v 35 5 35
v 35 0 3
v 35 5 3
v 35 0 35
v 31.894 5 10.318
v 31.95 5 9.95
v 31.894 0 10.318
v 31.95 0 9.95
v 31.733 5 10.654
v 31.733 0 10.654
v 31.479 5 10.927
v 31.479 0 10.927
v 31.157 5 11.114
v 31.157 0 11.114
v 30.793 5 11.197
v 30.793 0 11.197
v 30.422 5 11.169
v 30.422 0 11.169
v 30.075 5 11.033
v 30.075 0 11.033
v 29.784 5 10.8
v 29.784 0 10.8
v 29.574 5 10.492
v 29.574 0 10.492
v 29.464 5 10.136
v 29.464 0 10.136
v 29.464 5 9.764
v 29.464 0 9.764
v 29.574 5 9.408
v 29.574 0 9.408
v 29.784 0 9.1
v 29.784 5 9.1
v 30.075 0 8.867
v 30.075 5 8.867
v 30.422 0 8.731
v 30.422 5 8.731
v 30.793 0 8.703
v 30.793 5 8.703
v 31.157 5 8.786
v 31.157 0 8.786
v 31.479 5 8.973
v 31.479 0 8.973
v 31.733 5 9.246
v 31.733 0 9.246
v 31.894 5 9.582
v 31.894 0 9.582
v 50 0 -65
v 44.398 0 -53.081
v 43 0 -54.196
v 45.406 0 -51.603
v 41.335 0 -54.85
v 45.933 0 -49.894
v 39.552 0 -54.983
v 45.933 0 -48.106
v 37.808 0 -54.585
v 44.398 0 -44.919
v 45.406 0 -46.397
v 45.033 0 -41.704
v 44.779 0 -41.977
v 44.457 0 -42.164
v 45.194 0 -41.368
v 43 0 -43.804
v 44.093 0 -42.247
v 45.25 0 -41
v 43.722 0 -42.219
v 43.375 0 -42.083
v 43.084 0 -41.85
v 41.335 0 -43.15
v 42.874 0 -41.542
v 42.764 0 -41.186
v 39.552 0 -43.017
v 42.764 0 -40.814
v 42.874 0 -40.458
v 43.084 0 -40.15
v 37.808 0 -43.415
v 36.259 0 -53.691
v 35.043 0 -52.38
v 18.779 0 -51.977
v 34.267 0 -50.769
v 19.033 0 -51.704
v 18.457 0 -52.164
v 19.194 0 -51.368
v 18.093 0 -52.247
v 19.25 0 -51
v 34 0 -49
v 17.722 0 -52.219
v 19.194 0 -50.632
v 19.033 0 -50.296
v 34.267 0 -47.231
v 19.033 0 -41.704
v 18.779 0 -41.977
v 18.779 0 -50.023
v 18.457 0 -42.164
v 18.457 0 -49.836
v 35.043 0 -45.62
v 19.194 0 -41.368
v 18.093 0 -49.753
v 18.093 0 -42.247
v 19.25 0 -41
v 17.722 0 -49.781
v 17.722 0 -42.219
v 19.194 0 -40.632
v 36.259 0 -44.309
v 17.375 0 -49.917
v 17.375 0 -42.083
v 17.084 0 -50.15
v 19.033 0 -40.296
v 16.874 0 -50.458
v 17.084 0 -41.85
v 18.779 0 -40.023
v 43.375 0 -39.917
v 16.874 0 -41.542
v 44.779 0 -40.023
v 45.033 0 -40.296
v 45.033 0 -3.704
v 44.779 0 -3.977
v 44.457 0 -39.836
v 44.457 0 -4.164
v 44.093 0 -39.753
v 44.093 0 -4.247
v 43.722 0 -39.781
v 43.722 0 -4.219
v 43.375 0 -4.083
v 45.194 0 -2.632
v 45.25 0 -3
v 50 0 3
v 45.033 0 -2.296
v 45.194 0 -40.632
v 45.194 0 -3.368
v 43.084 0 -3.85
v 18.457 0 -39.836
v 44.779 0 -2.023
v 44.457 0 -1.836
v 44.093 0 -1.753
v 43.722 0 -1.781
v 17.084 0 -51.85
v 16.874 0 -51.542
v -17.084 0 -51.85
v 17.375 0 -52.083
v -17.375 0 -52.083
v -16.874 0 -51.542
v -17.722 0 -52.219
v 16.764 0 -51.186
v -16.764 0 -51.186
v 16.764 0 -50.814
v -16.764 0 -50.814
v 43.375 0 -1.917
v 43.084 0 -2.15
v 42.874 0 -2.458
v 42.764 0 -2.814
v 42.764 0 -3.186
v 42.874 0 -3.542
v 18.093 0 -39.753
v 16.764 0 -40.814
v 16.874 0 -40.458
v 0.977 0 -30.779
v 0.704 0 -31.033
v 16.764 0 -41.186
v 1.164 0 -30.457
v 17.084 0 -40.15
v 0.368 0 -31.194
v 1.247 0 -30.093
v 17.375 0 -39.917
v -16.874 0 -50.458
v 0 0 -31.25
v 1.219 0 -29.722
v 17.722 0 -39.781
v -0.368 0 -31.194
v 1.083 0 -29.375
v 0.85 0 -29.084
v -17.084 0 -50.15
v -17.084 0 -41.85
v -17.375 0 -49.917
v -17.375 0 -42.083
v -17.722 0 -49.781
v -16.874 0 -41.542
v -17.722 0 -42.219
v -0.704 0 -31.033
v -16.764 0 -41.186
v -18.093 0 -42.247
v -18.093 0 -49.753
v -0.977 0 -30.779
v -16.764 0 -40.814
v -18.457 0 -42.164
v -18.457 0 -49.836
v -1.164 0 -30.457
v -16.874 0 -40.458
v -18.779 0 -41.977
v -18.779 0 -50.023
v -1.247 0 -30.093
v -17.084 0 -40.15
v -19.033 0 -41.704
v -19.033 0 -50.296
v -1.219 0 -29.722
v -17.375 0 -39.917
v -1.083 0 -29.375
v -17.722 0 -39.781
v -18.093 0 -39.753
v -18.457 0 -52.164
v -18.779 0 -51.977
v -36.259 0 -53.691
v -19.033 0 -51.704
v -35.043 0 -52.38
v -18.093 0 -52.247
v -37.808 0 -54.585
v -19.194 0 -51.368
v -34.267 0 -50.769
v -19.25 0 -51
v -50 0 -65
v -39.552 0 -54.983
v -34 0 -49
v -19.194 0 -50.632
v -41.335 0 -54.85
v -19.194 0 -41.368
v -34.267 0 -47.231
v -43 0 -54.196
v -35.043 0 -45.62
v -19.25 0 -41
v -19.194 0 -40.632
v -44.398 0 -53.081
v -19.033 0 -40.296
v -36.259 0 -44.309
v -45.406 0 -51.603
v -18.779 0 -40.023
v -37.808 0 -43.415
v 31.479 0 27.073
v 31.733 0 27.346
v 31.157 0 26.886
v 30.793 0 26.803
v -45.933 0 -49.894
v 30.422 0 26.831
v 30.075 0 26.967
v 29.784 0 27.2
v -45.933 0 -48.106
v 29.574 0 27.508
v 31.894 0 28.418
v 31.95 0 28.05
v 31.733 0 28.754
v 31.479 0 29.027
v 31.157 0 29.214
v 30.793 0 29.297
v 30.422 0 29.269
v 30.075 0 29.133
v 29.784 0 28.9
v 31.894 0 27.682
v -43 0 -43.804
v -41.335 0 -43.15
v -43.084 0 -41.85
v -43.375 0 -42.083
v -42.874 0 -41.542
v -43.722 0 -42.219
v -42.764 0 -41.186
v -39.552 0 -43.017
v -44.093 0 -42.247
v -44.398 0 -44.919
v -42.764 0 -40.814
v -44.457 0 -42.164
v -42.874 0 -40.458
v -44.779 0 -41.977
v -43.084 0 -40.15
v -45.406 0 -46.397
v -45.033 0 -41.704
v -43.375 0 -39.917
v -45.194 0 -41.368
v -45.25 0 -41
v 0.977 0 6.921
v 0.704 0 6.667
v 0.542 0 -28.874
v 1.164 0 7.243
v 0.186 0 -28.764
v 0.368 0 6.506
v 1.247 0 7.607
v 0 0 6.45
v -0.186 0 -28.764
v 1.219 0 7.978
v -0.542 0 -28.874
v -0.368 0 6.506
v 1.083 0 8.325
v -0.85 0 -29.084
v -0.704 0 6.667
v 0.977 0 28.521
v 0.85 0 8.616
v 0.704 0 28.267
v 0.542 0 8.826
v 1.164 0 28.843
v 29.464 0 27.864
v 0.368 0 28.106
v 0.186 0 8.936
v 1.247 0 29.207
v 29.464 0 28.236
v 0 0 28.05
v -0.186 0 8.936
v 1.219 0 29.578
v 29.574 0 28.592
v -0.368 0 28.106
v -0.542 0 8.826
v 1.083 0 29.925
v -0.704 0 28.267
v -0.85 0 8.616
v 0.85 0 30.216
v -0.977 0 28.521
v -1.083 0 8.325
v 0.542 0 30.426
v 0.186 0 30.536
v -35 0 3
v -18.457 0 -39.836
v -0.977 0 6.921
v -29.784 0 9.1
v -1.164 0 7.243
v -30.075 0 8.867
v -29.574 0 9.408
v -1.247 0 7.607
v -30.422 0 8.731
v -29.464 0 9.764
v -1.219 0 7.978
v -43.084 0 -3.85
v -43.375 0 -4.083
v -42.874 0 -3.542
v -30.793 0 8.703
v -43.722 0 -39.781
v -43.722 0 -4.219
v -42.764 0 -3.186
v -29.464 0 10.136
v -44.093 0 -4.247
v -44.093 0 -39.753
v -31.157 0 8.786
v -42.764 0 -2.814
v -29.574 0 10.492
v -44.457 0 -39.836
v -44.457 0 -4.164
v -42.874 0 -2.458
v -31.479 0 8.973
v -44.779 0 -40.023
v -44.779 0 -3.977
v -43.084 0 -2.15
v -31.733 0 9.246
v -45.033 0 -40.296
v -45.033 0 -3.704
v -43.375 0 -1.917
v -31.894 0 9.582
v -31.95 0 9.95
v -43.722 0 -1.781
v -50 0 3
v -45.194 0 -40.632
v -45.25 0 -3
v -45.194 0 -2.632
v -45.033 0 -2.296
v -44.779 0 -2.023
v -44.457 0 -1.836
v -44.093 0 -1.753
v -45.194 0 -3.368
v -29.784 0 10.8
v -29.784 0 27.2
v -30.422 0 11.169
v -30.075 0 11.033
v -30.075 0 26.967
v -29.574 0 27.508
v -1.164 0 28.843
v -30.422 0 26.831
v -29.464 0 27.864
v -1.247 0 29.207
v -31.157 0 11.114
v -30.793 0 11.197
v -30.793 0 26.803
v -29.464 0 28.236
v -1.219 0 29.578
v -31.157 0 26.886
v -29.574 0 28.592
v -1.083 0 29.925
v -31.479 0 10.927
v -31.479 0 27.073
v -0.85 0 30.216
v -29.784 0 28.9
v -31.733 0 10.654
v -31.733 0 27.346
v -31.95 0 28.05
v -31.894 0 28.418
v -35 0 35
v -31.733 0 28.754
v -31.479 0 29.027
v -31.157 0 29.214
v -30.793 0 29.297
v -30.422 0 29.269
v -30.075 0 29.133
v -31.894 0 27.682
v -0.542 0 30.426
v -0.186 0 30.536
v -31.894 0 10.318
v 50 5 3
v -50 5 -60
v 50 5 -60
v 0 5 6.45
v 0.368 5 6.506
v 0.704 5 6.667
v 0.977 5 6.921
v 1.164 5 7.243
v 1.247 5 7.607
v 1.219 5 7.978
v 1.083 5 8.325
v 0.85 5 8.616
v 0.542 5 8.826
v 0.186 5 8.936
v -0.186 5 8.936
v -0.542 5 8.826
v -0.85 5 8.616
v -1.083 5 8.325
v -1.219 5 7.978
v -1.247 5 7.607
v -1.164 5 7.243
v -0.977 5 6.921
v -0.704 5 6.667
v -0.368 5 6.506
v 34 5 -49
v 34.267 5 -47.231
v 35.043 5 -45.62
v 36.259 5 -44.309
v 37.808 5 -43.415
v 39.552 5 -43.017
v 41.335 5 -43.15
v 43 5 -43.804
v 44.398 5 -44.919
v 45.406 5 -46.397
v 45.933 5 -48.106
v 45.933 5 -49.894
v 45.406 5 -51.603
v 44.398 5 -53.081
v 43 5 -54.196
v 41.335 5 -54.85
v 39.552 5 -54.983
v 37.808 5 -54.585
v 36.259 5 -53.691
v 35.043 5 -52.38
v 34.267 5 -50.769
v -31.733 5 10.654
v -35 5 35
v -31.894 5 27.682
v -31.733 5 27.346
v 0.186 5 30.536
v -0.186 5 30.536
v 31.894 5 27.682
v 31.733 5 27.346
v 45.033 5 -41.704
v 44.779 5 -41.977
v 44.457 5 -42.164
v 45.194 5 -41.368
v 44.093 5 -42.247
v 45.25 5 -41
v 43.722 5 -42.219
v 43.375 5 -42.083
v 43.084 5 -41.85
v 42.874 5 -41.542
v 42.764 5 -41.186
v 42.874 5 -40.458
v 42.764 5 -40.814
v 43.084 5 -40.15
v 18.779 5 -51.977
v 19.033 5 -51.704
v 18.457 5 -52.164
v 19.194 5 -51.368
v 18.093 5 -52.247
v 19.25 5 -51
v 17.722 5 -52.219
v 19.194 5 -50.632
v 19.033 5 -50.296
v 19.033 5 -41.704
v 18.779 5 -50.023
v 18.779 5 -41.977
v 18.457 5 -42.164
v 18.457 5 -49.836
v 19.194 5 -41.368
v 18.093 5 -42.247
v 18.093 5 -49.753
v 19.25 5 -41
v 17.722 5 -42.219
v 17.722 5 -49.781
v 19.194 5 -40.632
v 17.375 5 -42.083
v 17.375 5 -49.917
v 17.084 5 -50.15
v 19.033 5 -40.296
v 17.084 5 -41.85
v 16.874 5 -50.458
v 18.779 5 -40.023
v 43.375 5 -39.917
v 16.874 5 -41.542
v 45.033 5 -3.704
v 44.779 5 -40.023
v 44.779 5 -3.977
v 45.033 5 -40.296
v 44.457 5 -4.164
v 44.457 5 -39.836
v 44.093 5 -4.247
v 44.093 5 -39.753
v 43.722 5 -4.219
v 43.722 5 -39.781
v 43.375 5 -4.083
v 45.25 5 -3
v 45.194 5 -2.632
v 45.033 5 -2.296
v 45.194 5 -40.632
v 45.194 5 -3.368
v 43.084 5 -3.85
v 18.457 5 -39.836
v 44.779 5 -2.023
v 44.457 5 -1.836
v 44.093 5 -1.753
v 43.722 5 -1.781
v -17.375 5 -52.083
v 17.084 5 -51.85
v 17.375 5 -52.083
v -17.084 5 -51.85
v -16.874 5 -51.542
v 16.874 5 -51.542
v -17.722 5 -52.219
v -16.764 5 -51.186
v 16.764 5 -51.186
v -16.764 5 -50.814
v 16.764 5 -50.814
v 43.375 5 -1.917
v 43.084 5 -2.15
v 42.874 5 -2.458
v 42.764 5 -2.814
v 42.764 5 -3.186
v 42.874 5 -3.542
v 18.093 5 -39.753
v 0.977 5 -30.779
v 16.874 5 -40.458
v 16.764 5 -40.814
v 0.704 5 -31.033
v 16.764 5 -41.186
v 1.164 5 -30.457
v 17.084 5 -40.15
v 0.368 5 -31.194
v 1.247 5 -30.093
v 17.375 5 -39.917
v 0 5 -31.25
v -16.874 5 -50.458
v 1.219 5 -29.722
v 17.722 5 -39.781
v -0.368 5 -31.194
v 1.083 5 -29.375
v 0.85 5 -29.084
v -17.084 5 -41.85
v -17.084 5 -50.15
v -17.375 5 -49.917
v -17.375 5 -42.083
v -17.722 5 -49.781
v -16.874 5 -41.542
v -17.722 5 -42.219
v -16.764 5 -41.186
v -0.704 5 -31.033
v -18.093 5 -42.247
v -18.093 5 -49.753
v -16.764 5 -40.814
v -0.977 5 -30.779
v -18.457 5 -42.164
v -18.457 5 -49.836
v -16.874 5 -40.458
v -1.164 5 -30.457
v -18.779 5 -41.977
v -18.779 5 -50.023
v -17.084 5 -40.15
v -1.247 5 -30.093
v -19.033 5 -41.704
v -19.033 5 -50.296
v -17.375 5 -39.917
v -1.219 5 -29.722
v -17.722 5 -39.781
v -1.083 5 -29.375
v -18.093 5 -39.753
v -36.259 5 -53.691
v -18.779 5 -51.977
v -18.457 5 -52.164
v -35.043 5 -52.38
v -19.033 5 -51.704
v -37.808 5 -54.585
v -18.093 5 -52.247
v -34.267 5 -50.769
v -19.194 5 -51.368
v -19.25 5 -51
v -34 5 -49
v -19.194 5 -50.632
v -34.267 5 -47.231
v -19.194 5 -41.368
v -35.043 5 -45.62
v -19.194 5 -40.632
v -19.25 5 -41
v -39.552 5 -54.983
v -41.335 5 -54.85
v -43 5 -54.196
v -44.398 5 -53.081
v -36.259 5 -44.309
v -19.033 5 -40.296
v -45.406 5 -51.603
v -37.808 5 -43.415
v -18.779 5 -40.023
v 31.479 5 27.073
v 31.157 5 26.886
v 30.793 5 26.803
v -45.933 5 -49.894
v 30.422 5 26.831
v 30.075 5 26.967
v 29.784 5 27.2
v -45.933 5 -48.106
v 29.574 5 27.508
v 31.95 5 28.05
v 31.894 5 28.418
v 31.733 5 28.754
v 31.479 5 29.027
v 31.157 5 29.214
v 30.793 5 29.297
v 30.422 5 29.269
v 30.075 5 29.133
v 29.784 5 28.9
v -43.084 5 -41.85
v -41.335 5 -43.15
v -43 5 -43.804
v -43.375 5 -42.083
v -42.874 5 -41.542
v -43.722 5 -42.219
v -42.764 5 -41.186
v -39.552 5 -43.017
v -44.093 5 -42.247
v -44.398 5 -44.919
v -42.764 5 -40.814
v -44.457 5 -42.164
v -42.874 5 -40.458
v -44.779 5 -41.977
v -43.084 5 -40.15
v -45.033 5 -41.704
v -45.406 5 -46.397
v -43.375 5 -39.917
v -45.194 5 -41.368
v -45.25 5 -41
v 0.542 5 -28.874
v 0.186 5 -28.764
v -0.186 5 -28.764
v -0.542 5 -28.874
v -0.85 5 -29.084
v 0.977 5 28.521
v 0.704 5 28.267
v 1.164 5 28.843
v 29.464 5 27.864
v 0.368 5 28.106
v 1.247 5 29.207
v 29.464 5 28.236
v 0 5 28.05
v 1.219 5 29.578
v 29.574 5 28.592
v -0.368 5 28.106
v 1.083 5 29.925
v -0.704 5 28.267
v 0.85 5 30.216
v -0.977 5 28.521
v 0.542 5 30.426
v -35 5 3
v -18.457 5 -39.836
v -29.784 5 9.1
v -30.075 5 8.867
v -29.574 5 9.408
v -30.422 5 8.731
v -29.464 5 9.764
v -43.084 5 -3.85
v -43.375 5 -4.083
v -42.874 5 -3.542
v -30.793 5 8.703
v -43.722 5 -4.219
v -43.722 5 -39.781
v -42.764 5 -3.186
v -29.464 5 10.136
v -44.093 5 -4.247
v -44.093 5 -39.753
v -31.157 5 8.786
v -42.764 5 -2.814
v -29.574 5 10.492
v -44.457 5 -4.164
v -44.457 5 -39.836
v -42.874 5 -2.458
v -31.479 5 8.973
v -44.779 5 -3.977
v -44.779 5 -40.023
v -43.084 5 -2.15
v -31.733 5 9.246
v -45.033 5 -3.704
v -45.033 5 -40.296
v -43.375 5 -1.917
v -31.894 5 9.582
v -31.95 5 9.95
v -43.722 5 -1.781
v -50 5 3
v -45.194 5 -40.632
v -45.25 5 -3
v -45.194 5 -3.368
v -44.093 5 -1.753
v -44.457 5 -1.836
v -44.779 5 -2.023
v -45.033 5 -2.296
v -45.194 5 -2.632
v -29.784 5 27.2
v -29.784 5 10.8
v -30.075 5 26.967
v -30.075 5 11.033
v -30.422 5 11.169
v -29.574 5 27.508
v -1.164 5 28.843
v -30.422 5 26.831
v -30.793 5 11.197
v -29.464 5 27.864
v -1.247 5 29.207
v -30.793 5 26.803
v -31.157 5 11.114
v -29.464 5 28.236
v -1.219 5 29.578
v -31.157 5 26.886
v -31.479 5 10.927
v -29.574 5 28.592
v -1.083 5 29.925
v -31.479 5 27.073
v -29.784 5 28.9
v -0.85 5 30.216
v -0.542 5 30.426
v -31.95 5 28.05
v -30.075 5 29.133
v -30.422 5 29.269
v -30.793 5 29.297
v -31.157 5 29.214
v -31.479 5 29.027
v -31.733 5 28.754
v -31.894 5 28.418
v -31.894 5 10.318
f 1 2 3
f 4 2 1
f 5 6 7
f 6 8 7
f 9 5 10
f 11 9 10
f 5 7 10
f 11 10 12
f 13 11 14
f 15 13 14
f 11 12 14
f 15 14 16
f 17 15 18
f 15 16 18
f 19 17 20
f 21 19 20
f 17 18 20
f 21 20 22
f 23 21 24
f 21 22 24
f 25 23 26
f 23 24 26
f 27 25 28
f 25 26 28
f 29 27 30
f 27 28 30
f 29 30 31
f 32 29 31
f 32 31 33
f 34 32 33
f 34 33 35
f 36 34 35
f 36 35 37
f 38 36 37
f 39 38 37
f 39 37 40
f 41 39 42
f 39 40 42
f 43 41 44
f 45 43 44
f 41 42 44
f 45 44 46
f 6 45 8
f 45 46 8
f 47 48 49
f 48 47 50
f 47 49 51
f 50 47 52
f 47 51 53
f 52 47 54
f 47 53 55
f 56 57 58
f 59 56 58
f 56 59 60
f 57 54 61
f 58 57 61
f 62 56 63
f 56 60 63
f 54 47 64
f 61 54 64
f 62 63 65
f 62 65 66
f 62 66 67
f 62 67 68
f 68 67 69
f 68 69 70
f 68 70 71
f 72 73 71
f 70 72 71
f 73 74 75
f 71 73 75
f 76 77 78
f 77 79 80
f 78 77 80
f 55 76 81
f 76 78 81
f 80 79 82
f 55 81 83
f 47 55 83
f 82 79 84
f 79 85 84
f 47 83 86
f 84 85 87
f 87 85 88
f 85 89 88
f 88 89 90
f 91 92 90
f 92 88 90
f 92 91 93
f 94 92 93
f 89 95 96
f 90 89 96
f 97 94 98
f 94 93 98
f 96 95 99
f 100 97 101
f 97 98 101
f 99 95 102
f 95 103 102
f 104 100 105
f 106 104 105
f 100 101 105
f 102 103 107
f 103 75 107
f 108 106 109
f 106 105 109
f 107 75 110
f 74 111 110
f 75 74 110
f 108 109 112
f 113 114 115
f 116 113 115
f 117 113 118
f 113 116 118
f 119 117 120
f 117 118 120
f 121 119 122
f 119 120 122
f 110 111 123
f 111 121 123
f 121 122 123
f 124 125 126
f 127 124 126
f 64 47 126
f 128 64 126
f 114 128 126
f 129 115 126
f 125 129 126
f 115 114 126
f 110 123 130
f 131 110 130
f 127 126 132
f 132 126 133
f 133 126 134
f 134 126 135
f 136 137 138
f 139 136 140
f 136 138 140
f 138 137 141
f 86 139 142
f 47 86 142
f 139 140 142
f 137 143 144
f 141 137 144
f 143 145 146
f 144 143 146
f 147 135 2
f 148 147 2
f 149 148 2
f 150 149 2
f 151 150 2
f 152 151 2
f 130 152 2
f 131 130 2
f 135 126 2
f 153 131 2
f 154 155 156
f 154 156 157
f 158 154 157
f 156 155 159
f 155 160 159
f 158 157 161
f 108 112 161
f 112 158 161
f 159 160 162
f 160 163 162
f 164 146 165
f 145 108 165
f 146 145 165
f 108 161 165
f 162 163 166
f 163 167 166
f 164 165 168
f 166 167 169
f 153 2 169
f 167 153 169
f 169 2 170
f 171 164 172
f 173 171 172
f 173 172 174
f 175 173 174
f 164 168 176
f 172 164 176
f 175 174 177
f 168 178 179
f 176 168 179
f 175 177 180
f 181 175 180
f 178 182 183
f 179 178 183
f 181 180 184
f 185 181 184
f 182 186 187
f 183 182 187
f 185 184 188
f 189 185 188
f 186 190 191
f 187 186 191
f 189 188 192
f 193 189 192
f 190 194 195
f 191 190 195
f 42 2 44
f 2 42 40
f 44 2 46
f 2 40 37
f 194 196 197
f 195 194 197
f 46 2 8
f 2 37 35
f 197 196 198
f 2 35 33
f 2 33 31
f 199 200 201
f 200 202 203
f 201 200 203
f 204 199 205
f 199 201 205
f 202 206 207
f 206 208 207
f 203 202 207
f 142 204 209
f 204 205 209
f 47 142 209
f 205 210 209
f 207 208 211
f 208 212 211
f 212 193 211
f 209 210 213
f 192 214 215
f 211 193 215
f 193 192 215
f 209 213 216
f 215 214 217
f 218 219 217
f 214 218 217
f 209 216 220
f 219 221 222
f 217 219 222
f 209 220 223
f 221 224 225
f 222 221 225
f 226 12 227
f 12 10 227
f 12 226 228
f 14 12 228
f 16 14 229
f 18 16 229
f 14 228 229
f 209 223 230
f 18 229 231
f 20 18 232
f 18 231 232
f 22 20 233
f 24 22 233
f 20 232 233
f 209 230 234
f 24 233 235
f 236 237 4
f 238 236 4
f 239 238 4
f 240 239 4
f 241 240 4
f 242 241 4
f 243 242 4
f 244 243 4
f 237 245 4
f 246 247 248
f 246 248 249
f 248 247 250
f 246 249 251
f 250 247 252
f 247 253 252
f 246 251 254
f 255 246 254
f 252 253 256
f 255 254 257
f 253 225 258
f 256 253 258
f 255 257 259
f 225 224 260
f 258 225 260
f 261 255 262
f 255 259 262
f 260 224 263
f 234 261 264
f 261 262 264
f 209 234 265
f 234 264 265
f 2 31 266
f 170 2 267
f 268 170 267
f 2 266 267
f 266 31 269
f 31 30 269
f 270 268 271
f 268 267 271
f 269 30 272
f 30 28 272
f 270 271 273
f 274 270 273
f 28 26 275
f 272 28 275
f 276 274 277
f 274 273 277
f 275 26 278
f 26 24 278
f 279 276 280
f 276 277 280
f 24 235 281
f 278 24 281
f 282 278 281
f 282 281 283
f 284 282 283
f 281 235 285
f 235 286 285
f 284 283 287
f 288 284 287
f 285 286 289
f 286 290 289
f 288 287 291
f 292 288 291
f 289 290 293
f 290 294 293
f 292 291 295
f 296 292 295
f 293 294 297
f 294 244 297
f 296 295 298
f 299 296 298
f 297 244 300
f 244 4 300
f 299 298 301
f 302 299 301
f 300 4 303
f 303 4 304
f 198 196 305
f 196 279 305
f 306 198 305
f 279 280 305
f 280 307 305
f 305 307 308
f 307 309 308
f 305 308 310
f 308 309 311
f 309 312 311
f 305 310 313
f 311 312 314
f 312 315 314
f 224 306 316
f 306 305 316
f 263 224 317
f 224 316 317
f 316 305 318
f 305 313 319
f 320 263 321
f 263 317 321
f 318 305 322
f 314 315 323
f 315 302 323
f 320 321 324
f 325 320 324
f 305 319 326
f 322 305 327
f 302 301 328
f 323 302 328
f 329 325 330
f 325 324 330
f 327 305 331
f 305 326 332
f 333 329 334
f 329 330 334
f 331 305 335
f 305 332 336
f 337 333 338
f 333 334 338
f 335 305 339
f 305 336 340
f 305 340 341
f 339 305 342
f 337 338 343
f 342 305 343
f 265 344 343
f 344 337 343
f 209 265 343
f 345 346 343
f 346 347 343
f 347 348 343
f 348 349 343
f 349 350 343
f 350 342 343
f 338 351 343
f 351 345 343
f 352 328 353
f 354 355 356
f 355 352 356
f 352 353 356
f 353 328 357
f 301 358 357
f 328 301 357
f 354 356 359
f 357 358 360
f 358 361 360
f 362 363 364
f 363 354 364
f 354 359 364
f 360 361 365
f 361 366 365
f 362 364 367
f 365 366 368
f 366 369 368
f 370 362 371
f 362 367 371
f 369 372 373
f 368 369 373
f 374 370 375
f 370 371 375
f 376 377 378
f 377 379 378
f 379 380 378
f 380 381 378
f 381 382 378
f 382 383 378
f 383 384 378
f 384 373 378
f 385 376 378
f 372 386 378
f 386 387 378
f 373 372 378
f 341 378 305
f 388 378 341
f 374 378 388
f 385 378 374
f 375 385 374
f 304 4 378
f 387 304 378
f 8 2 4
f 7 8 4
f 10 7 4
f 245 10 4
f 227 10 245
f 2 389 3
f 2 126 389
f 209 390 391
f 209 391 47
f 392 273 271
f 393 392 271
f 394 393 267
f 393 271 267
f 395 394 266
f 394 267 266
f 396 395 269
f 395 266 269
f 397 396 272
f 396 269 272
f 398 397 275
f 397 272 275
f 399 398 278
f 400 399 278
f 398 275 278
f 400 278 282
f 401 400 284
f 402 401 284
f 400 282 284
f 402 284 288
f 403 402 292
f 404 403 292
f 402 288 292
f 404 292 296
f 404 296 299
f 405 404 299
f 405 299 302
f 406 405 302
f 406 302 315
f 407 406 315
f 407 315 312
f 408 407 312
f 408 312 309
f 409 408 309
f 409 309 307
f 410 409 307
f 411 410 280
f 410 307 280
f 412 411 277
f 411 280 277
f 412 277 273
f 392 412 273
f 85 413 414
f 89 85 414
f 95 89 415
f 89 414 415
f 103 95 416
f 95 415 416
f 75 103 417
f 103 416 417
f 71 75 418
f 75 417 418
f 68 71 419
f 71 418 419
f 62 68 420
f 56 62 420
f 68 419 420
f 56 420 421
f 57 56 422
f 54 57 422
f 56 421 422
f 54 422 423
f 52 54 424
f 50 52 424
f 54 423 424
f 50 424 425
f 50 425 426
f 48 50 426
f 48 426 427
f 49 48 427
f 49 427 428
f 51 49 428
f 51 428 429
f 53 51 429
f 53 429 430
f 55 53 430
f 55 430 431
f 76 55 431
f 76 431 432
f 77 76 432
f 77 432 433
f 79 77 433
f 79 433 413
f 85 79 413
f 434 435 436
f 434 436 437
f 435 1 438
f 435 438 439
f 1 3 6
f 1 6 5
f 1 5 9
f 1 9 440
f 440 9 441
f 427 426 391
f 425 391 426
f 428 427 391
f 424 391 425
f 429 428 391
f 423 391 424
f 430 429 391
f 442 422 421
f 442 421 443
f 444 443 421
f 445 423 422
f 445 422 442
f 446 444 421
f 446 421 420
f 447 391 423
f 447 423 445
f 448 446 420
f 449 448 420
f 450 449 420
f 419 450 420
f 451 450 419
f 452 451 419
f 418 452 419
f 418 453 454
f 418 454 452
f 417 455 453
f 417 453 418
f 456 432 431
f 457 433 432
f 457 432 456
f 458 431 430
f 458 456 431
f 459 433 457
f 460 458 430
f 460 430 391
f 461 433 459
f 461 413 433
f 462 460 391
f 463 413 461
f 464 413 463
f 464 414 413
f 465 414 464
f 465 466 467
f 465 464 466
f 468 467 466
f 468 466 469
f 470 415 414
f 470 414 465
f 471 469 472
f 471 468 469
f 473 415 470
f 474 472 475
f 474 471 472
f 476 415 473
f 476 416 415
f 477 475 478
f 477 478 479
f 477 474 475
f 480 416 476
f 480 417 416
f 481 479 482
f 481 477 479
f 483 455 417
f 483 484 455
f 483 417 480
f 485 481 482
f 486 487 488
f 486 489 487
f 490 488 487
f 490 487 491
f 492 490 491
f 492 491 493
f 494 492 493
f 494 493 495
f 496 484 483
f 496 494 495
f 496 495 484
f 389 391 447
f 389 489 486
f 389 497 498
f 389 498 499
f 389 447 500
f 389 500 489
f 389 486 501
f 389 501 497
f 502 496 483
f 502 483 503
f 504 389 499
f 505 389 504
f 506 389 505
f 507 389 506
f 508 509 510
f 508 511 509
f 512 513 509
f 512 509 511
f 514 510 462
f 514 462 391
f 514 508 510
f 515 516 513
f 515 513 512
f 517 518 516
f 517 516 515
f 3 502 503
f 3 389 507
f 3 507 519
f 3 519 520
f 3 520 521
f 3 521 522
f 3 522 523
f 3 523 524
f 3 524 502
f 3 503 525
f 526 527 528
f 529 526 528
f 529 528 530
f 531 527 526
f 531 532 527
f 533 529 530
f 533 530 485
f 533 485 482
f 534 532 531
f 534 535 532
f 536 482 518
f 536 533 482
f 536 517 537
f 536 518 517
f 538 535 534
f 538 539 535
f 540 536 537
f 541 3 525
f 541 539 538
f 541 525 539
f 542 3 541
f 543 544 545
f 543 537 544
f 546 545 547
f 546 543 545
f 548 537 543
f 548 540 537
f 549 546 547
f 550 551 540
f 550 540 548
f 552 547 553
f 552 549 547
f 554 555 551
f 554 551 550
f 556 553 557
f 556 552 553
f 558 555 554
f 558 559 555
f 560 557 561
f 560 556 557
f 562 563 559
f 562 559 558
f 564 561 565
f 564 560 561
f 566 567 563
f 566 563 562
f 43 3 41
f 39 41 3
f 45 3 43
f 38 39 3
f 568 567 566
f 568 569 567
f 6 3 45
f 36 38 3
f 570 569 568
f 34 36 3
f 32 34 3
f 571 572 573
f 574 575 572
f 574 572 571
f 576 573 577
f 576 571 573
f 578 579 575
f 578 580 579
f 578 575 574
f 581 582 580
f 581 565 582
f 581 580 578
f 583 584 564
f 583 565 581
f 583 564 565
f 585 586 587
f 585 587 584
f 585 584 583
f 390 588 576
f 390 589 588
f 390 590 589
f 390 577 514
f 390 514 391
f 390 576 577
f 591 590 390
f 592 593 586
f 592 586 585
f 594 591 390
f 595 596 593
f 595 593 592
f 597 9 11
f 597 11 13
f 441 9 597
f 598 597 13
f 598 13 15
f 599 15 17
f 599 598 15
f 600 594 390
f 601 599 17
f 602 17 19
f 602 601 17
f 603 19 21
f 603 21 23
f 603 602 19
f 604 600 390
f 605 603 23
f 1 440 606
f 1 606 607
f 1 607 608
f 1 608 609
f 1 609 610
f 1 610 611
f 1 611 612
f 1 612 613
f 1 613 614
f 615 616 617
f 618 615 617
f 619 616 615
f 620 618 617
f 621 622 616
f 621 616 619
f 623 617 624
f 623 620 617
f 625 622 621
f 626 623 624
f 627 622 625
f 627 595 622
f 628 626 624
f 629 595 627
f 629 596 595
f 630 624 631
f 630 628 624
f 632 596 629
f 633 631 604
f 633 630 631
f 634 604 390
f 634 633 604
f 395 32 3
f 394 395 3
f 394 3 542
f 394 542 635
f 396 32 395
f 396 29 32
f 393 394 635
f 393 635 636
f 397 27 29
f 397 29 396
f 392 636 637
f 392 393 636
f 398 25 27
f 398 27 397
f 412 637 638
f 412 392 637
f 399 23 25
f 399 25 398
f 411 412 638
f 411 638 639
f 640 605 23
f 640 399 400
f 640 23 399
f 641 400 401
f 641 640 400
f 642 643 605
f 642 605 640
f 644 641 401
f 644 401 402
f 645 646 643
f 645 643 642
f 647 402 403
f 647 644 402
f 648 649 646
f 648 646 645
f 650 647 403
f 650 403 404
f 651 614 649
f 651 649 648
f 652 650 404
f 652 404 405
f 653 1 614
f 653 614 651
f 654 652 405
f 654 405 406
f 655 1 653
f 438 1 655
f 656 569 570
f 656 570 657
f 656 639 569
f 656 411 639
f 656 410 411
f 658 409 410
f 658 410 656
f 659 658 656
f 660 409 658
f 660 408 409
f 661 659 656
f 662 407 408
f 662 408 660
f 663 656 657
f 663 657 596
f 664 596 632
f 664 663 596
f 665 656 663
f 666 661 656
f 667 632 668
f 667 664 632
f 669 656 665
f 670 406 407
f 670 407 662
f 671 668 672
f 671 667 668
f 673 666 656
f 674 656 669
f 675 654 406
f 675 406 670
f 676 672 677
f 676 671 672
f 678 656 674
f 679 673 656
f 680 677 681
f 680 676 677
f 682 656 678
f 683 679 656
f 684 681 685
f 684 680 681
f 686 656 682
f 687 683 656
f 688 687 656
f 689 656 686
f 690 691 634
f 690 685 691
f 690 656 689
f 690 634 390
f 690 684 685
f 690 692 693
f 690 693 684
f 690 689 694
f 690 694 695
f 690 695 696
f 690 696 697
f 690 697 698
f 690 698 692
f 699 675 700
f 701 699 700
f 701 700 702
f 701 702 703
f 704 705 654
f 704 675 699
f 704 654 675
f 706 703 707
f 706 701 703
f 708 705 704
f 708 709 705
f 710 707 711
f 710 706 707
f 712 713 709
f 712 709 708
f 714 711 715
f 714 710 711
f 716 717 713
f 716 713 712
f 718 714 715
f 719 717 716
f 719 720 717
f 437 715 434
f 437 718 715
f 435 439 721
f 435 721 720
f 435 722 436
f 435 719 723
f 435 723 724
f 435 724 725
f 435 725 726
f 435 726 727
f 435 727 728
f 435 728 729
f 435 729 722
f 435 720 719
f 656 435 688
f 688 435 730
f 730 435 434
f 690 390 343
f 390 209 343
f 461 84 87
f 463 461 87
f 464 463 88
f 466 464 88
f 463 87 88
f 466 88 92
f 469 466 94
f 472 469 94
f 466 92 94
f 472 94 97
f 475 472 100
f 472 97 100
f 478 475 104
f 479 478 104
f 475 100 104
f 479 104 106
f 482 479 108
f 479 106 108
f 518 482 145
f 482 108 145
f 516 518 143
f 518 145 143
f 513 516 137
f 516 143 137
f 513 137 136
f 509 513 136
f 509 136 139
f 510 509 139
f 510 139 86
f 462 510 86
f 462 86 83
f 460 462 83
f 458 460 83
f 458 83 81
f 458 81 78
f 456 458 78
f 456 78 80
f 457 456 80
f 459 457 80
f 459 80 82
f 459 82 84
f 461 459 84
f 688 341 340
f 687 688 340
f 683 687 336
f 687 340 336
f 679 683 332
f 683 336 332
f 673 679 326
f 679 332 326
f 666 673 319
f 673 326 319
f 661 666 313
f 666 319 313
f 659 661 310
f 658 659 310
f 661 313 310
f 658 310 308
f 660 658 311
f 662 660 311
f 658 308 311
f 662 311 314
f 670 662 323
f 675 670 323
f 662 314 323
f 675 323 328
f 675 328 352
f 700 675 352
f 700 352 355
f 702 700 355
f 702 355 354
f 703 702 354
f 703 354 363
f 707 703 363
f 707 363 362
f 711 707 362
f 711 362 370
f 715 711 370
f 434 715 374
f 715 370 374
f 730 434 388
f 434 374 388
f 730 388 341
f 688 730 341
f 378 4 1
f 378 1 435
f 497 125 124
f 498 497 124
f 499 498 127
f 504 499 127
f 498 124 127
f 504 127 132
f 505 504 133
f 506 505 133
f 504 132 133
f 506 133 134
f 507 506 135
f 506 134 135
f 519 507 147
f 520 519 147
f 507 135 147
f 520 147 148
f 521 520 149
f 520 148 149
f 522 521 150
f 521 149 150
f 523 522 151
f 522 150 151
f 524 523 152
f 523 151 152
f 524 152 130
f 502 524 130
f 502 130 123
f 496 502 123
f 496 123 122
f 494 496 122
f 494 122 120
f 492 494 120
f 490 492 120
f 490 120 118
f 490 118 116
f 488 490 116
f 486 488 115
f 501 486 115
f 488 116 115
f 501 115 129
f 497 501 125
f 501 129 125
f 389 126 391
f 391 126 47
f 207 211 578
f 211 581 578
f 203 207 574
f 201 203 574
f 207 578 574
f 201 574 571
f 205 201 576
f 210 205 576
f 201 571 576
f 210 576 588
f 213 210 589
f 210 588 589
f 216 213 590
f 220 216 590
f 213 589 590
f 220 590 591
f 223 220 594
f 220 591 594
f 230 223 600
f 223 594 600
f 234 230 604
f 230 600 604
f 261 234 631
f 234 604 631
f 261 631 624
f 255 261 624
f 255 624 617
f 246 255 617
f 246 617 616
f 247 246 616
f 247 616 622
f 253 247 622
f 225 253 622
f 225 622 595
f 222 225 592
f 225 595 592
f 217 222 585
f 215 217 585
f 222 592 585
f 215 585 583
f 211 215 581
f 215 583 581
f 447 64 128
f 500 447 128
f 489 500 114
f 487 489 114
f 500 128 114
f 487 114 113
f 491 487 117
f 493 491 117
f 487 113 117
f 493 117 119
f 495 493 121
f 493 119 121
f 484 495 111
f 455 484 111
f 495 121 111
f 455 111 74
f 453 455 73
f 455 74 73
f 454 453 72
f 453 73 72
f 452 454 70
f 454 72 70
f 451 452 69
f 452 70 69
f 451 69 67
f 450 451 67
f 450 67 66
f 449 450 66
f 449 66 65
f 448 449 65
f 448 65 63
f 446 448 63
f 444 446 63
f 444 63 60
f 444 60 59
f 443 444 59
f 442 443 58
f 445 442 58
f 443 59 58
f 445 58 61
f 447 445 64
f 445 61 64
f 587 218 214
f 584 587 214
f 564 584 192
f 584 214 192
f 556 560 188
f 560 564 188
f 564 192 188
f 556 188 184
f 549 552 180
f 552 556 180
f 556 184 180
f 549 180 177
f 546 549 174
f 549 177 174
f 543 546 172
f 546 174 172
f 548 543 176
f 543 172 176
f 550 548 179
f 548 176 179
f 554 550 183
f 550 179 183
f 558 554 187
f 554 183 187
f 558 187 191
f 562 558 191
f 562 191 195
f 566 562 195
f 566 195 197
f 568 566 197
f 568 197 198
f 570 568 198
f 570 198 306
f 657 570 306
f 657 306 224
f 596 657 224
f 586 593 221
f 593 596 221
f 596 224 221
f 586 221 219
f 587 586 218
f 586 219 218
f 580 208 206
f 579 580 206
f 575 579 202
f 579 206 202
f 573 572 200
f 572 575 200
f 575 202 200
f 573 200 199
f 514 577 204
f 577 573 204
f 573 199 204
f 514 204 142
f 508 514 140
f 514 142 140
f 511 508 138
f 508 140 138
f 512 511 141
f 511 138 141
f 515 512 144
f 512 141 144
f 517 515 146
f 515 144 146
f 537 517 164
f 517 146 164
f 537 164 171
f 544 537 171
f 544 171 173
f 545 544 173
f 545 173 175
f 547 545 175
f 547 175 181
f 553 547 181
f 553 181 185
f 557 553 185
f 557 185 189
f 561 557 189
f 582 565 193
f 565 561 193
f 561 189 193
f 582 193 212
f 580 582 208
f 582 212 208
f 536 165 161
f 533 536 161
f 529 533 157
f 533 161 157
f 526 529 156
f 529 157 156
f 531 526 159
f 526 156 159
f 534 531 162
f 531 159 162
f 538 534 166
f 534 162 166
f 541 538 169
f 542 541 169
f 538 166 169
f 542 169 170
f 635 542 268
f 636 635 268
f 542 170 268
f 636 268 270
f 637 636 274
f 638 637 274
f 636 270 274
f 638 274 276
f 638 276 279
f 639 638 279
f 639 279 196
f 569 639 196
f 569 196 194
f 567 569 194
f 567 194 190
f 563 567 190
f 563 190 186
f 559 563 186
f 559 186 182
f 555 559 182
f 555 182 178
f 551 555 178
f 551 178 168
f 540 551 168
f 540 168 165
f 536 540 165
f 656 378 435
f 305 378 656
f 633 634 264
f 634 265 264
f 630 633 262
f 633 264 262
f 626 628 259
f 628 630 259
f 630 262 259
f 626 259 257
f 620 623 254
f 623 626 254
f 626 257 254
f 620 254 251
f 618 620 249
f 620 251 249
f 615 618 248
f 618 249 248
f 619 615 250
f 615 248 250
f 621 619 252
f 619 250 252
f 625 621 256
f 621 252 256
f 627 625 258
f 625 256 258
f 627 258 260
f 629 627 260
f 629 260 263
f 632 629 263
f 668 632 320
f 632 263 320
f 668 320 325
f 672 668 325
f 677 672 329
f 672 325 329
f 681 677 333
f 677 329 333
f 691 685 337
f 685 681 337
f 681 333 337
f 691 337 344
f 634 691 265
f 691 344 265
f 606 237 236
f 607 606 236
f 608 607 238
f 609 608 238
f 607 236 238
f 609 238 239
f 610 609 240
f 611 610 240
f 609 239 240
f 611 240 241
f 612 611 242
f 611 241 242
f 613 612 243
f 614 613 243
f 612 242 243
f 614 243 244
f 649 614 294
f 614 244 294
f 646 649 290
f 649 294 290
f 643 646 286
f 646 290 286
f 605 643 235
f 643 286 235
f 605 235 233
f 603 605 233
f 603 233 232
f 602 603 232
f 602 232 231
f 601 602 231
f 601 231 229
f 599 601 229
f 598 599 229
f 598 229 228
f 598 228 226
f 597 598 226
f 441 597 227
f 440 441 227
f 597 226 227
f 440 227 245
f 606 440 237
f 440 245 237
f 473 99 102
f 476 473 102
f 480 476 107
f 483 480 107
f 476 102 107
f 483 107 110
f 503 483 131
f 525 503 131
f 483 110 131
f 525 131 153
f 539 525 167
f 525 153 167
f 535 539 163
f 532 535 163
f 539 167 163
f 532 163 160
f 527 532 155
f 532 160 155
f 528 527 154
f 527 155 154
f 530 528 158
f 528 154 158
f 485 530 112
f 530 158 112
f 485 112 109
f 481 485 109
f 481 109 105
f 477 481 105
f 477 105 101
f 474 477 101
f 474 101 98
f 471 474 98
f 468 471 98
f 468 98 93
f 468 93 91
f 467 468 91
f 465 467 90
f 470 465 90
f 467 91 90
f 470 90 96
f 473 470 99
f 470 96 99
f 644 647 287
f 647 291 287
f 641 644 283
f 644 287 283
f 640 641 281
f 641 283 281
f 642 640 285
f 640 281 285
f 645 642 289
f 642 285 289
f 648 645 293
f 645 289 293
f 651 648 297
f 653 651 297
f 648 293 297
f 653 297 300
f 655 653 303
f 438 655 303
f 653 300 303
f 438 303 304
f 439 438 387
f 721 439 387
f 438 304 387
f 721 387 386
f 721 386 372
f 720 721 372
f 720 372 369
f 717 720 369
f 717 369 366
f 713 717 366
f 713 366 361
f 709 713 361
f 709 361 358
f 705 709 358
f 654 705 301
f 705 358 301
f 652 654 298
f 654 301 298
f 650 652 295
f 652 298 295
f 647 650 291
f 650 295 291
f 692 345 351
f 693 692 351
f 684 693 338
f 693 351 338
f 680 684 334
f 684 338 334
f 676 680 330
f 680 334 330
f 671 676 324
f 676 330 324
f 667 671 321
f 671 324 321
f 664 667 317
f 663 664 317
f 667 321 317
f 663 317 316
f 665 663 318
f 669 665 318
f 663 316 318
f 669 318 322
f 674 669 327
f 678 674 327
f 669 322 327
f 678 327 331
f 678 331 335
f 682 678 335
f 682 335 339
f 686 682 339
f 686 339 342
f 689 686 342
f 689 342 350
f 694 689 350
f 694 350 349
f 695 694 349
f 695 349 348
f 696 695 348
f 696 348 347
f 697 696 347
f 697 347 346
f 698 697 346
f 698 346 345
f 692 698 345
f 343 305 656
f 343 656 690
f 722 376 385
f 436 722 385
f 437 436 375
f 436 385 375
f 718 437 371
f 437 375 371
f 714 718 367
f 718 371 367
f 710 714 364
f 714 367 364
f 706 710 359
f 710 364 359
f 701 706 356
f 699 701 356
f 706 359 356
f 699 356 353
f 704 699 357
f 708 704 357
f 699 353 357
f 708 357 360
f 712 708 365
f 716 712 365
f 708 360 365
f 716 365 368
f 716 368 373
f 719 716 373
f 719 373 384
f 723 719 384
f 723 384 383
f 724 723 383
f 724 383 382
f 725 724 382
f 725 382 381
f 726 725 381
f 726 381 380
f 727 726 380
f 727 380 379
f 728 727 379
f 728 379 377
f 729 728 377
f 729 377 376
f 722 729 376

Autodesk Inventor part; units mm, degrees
ref_plane "YZ Plane" through (0, 0, 0) normal (1, 0, 0) x (0, 1, 0)
ref_plane "XZ Plane" through (0, 0, 0) normal (0, 1, 0) x (-1, 0, 0)
ref_plane "XY Plane" through (0, 0, 0) normal (0, 0, 1) x (1, 0, 0)
sketch "Sketch1" plane through (0, 0, 0) normal (0, 1, 0) x (-1, 0, 0)
  line L0 (35, 35) -> (35, 3)
  line L1 (9, 3) -> (35, 3) construction
  line L2 (0, 3) -> (9, 3) construction
  line L3 (35, 3) -> (50, 3)
  line L4 (0, -35) -> (0, 35)
  line L5 (0, -35) -> (50, -35)
  line L6 (0, 35) -> (35, 35)
  line L7 (50, -35) -> (50, 3)
  line L8 (30.7, 28.05) -> (35, 28.05) construction
  line L9 (30.7, 28.05) -> (30.7, 9.95) construction
  line L10 (30.7, 9.95) -> (30.7, 3) construction
  circle A0 centre (30.7, 9.95) radius 1.25
  circle A1 centre (30.7, 28.05) radius 1.25
  circle A2 centre (44, -3) radius 1.25
  arc A3 (0, -31.25) -> (0, -28.75) centre (0, -30) ccw
  arc A4 (0, 6.45) -> (0, 8.95) centre (0, 7.7) ccw
  arc A5 (0, 28.05) -> (0, 30.55) centre (0, 29.3) ccw
  line L11 (0, 29.3) -> (30.7, 29.3) construction
  line L12 (50, -35) -> (50, -65)
  line L13 (50, -65) -> (0, -65)
  line L14 (0, -35) -> (0, -65)
  circle A6 centre (44, -41) radius 1.25
  circle A7 centre (18, -41) radius 1.25
  circle A8 centre (18, -51) radius 1.25
  point P0 (0, 0)
  point P1 (-50, 0)
  point P2 (0, 0)
  dimension "d26" = 2.5
  dimension "d6" = 32
  dimension "d9" = 26
  dimension "d10" = 9
  dimension "d11" = 50
  dimension "d12" = 70
  dimension "d14" = 4.3
  dimension "d15" = 18.1
  dimension "d20" = 6.95
  dimension "d25" = 2.5
  dimension "d32" = 2.5
  dimension "d33" = 2.5
  dimension "d35" = 2.5
  dimension "d36" = 30
  dimension "d37" = 6
  dimension "d38" = 6
  dimension "d39" = 32
  dimension "d40" = 10
  dimension "d41" = 2.5
  dimension "d42" = 2.5
  dimension "d43" = 2.5
  dimension "d55" = 6
  dimension "d56" = 6
  dimension "d57" = 2.5
  dimension "d58" = 5
  dimension "d59" = 2.25
extrude "Extrusion1" add sketch "Sketch1" along normal blind 5 contours L0 L3 L7 L5 L4 A3 A4 A5 L6 | A5 L4 | L12 L13 L14 L5 | A4 L4 | L4 A3 | A0 | A1 | A2
extrude "Extrusion4" cut sketch "Sketch1" along normal through all contours A5 L4 | A4 L4 | L4 A3 | A0 | A1 | A2
mirror "Mirror1" about plane through (0, 0, 0) normal (1, 0, 0) of "Extrusion1", "Extrusion4"
sketch "Sketch4" plane through (-50, 0, -65) normal (-1, 0, 0) x (0, 0, 1)
  line L0 (0, 5) -> (68, 5) projected
  line L1 (0, 5) -> (5, 5)
  line L2 (0, 0) -> (68, 0) projected
  line L3 (5, 5) -> (0, 0)
  line L4 (0, 0) -> (0, 5) projected
  line L5 (0, 0) -> (0, 5)
  point P0 (65, 0)
  dimension "d44" = 5
extrude "Extrusion5" cut sketch "Sketch4" against normal through all
sketch "Sketch5" plane through (0, 5, 0) normal (0, 1, 0) x (1, 0, 0)
  circle A0 centre (-40, 49) radius 6
  line L0 (-50, 60) -> (-50, -3) projected
  line L1 (50, 60) -> (-50, 60) projected
  point P0 (0, 0)
  dimension "d50" = 10
  dimension "d51" = 11
  dimension "d52" = 12
extrude "Extrusion6" cut sketch "Sketch5" against normal through all
mirror "Mirror2" about plane through (0, 0, 0) normal (1, 0, 0) of "Extrusion6"
properties part number "Podstawa_All_in_One_5mm"
